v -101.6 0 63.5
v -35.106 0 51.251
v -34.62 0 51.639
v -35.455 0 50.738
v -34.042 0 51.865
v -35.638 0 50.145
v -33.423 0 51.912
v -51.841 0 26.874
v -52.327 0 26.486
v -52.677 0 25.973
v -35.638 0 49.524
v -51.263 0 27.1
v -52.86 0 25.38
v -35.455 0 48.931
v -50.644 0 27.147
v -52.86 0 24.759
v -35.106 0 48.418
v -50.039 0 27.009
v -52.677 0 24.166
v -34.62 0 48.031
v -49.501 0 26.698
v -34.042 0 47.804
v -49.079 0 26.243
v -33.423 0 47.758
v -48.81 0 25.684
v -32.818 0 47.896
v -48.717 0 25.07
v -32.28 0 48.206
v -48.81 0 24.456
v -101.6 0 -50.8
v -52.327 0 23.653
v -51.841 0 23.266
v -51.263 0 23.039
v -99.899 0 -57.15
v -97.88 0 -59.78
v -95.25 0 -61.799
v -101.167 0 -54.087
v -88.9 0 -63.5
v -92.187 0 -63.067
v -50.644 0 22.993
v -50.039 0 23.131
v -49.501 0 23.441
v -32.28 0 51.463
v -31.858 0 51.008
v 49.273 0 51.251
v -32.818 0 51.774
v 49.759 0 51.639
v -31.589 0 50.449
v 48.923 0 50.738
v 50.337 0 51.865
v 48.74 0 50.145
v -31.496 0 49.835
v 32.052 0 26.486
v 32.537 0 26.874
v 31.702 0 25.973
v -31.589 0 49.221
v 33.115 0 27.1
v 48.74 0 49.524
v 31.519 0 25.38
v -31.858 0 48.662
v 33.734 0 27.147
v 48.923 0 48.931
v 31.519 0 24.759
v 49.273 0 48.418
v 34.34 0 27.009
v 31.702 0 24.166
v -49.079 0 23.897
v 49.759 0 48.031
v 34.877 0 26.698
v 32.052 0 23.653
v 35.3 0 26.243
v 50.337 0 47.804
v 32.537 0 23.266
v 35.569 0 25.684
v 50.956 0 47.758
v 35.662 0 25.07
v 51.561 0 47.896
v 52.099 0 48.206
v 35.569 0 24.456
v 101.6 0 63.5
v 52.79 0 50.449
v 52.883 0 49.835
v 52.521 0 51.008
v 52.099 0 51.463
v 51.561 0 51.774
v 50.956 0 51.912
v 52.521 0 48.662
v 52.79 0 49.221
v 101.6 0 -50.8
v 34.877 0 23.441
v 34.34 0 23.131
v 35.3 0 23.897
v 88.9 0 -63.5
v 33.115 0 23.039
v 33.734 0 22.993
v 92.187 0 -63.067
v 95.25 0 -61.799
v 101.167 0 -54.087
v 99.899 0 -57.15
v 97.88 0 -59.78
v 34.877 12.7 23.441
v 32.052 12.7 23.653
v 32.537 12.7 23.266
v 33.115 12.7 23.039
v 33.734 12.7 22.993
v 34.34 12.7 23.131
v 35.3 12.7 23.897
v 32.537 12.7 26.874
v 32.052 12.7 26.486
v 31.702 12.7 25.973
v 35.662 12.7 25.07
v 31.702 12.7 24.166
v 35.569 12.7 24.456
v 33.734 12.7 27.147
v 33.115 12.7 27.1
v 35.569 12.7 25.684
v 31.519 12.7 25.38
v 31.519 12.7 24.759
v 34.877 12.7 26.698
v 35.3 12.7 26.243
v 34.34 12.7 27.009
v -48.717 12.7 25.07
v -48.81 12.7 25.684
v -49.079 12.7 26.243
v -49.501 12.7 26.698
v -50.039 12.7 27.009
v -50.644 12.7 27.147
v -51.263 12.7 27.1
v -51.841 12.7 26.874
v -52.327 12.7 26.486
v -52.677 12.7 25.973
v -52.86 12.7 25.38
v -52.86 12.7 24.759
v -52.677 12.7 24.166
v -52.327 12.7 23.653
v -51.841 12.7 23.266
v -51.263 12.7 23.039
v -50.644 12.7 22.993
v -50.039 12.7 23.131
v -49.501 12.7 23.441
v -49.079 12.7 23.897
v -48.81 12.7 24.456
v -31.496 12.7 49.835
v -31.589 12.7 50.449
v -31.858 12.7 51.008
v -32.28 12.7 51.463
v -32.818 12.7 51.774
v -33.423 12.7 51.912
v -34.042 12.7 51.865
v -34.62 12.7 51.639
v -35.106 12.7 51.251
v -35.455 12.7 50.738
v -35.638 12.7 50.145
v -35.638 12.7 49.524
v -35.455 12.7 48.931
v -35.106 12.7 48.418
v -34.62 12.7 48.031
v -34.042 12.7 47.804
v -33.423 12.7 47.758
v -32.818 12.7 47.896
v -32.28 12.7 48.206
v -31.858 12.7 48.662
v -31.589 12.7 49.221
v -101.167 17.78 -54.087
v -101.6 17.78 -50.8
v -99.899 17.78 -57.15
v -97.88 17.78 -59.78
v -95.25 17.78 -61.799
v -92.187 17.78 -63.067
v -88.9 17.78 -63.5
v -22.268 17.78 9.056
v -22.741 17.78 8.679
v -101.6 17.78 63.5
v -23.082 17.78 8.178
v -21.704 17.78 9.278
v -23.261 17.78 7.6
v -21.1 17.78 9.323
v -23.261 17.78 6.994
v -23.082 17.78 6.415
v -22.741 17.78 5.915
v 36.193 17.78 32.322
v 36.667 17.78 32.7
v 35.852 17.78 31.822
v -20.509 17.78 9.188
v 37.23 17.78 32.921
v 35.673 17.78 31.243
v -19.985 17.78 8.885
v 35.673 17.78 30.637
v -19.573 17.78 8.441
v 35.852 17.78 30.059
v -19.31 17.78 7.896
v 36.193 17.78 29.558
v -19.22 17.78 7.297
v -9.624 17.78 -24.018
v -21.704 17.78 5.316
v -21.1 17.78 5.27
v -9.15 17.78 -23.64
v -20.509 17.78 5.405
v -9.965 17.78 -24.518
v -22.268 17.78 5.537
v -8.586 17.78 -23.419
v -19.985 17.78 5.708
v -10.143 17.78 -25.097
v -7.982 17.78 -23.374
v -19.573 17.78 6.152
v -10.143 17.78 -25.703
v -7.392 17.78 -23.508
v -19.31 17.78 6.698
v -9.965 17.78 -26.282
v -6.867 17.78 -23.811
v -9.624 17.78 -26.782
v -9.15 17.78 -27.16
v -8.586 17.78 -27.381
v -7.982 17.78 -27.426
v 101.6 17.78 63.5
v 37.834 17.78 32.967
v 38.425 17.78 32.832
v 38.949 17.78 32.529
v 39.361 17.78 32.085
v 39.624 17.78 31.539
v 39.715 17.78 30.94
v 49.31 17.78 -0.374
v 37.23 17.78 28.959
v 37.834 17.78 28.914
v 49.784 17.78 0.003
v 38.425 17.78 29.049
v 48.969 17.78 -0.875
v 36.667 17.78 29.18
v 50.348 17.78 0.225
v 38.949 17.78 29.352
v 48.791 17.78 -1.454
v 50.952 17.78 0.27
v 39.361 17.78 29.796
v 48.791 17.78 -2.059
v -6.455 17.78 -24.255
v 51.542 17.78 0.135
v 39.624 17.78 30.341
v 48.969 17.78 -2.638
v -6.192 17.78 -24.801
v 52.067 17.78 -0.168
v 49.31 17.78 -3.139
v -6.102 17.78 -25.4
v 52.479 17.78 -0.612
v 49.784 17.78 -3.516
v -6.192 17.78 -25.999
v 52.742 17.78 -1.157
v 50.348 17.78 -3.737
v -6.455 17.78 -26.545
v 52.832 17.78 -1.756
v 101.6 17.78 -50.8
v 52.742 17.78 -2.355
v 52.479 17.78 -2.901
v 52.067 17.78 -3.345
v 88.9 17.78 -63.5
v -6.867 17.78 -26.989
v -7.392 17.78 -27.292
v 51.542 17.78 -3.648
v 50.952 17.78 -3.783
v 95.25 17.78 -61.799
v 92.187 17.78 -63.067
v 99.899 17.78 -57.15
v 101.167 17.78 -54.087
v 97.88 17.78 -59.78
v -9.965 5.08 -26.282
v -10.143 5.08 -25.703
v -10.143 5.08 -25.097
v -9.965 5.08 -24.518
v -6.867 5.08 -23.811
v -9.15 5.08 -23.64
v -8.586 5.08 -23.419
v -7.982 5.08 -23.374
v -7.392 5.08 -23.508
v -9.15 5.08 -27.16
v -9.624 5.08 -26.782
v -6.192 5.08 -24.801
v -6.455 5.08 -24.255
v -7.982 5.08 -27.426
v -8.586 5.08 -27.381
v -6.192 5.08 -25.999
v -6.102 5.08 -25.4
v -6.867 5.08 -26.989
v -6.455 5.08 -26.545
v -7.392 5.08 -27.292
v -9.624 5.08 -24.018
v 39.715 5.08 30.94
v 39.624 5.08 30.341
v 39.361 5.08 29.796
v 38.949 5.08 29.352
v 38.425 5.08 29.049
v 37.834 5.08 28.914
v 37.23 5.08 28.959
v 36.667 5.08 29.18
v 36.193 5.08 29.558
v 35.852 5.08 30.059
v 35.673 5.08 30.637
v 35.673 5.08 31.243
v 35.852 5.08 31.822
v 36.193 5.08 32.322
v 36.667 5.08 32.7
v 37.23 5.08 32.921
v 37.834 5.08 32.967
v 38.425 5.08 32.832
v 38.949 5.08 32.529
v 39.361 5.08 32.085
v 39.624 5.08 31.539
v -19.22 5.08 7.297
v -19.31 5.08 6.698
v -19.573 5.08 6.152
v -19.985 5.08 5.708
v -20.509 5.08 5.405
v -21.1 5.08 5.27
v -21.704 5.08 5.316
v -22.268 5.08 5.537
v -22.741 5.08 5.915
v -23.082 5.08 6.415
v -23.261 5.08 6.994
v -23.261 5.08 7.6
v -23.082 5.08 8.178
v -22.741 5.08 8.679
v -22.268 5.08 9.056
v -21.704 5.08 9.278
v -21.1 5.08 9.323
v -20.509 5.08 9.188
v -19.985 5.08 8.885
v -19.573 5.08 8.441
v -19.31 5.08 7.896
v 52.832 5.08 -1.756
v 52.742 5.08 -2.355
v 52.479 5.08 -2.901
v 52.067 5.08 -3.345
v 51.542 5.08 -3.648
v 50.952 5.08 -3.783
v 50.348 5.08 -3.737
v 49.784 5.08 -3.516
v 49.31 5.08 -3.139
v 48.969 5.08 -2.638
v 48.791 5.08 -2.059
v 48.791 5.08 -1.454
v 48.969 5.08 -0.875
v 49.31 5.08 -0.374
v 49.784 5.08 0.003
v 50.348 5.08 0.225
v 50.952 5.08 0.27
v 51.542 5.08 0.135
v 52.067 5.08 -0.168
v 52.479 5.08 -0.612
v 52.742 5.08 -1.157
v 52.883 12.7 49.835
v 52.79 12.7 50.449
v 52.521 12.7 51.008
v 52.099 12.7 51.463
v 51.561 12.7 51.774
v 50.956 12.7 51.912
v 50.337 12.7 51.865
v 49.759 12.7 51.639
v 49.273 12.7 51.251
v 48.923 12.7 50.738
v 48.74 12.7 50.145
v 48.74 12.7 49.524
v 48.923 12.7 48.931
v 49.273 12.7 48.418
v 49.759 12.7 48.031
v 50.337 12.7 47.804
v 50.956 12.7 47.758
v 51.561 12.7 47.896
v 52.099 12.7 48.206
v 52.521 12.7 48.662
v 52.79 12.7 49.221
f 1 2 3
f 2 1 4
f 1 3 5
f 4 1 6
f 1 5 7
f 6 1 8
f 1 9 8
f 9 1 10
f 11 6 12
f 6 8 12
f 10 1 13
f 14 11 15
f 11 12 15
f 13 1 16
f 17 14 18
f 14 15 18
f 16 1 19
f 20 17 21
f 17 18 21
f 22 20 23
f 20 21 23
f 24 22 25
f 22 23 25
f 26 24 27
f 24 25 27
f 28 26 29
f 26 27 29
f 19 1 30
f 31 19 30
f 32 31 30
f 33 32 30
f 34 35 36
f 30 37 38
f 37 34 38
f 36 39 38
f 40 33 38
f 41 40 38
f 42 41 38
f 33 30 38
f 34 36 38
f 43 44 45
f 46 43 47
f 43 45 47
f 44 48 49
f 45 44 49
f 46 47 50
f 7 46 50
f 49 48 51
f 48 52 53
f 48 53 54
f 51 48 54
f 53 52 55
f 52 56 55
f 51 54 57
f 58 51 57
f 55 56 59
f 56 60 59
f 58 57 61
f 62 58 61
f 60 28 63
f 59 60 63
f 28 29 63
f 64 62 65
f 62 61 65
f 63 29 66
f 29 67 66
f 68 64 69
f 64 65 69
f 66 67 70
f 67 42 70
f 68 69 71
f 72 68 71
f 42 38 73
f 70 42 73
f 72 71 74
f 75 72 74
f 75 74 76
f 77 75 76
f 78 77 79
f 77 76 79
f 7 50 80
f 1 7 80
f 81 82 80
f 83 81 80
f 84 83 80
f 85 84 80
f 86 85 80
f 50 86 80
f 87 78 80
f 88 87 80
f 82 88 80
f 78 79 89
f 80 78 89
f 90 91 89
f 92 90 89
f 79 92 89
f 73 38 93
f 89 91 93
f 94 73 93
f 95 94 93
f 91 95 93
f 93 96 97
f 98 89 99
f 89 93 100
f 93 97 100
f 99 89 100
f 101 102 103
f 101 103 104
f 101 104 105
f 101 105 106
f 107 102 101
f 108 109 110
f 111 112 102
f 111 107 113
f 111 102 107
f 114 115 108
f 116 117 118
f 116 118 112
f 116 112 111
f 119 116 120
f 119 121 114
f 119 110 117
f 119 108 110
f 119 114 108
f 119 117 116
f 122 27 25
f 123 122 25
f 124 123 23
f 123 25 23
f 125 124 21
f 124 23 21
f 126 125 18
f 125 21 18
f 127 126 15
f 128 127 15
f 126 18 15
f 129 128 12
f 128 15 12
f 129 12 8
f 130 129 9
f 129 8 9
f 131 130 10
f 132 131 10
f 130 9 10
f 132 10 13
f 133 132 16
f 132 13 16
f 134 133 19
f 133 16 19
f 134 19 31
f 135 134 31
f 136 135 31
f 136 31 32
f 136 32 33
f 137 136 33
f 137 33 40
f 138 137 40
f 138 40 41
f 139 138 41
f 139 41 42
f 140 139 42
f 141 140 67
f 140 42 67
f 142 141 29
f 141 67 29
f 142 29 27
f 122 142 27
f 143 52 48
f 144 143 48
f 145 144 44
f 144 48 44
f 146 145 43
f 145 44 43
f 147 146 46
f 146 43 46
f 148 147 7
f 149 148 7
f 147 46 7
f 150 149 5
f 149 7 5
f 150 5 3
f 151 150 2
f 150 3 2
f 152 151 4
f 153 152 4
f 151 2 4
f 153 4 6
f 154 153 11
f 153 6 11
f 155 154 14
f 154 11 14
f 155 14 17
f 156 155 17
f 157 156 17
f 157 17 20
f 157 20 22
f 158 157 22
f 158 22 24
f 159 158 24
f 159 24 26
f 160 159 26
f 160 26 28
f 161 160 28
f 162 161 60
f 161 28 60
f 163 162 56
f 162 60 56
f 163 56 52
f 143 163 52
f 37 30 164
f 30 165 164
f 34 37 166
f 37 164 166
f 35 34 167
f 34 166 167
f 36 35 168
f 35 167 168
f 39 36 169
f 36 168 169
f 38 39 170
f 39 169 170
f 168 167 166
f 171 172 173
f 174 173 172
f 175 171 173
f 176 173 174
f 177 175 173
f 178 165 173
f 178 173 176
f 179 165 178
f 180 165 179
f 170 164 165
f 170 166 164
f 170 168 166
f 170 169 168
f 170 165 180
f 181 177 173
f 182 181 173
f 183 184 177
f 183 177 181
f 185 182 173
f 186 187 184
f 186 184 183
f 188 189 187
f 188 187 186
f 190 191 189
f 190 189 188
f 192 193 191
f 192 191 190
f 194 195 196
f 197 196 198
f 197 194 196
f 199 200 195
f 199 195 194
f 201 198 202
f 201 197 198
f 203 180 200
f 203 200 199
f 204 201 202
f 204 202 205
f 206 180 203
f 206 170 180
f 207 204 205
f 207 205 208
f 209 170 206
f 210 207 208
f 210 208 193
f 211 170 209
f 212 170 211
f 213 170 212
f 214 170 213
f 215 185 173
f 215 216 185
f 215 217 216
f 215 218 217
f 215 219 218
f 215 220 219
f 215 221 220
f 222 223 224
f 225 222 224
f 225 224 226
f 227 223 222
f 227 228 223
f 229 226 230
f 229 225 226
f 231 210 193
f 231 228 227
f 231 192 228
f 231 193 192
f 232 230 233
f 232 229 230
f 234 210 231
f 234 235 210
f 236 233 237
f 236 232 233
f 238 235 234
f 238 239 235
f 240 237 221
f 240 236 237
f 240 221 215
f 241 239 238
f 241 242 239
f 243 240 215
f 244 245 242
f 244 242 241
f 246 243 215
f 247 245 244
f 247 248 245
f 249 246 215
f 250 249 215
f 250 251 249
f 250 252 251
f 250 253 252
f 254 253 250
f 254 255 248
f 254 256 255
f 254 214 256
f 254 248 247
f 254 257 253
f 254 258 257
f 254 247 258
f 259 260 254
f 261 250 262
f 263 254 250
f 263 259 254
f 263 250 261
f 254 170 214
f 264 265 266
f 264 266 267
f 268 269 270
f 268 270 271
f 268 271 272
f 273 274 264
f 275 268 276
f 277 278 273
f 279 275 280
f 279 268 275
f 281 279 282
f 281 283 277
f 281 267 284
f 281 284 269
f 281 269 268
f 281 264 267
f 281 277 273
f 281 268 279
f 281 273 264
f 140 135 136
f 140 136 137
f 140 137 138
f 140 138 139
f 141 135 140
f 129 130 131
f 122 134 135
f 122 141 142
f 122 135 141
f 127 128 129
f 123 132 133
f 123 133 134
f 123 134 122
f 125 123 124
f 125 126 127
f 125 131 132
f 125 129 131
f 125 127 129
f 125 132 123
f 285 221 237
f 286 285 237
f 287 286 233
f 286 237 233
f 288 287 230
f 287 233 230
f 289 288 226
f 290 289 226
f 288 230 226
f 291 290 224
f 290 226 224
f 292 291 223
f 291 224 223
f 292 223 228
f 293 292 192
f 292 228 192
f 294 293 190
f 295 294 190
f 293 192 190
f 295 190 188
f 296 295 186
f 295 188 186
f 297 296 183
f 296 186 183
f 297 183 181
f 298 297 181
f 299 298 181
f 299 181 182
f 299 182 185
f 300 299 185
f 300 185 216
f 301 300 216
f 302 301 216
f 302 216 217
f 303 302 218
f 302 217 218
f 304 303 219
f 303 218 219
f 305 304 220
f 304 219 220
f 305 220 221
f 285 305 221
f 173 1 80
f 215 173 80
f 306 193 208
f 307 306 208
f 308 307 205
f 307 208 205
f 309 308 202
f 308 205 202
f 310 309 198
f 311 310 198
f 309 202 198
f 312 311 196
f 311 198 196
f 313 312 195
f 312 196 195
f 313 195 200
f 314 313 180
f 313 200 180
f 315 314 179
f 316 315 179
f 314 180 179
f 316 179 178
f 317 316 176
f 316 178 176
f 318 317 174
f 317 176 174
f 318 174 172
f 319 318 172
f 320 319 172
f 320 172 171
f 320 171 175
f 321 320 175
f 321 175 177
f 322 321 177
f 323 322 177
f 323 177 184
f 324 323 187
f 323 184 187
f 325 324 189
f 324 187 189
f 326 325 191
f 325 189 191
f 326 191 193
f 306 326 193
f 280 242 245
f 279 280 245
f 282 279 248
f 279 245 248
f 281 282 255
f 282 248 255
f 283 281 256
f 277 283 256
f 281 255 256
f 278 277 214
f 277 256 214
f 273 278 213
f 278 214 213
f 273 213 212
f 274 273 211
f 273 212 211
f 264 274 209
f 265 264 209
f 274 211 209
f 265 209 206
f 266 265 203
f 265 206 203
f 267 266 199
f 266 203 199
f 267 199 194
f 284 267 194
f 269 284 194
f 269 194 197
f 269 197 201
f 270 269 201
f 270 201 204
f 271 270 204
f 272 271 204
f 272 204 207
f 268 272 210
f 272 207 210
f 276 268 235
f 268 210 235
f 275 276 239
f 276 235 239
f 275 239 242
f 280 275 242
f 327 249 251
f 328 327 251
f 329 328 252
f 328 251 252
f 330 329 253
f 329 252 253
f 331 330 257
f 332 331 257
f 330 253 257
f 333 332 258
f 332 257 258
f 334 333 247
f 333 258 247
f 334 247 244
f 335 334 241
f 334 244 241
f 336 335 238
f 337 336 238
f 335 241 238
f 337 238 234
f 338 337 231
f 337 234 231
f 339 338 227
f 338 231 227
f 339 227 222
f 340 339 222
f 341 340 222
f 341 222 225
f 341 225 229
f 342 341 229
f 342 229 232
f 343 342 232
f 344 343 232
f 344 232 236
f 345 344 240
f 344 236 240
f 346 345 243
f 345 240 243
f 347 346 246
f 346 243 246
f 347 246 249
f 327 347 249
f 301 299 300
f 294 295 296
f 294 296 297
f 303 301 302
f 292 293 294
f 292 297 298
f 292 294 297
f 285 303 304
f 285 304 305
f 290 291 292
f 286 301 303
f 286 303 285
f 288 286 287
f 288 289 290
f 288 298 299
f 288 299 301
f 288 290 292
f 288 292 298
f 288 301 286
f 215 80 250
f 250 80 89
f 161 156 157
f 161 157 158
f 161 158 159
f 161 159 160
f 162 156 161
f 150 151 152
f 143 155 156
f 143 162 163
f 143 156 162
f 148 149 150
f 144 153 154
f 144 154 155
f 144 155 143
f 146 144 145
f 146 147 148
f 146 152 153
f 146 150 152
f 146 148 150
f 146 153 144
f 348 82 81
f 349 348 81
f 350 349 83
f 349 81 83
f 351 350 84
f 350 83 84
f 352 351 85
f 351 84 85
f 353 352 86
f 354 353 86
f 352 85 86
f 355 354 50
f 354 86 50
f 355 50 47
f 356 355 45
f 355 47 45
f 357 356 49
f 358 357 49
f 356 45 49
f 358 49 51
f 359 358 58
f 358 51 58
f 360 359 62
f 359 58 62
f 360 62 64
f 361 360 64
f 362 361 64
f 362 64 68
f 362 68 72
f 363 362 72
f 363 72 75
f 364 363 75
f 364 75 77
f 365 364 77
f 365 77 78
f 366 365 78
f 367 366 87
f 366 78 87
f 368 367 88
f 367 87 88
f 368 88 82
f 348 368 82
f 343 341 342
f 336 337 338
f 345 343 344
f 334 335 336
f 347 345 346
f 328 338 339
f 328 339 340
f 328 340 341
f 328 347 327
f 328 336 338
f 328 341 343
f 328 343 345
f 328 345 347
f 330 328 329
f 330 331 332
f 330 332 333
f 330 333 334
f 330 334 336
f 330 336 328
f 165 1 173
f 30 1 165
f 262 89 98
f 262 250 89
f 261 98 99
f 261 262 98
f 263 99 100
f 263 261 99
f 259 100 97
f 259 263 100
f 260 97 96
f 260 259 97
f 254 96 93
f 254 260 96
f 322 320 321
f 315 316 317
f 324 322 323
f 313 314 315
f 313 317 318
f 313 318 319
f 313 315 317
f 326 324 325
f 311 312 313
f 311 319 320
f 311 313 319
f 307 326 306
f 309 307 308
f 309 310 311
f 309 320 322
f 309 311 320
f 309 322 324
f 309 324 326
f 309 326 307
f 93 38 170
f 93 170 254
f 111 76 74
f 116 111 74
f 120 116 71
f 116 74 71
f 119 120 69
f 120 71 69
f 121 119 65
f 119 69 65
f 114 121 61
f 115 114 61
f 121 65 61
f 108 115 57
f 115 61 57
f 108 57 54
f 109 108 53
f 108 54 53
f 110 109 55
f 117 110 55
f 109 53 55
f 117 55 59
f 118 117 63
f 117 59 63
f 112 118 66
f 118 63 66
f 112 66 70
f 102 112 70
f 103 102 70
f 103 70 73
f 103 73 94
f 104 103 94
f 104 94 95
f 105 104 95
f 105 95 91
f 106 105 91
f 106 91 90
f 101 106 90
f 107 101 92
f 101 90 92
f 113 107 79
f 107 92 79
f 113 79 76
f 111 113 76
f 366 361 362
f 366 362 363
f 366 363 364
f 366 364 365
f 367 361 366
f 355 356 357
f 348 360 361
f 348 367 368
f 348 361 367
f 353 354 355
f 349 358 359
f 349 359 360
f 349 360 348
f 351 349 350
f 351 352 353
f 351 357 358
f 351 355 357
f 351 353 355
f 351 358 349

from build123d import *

# Parameters (mm, degrees)
SKETCH2_W           = 203.2
SKETCH2_H           = 127
BOSS_EXTRUDE2_DEPTH = 17.78
FILLET1_R           = 12.7
SKETCH5_R           = 2.0828
CUT_EXTRUDE2_DEPTH  = 12.7
SKETCH6_R           = 2.032
CUT_EXTRUDE3_DEPTH  = 12.7


with BuildPart() as part:
    # Sketch2 → Boss-Extrude2 (new body)
    with BuildSketch(Plane(origin=(0, 0, 0), x_dir=(1, 0, 0), z_dir=(0, 1, 0))):
        Rectangle(SKETCH2_W, SKETCH2_H)
    extrude(amount=BOSS_EXTRUDE2_DEPTH)

    # Fillet1
    fillet1_edges = [part.edges().sort_by_distance(p)[0] for p in [
        (-101.6, 8.89, -63.5),
        (101.6, 8.89, -63.5),
    ]]
    fillet(fillet1_edges, radius=FILLET1_R)

    # Sketch5 → Cut-Extrude2 (cut)
    with BuildSketch(Plane.XZ):
        with Locations((50.8, 49.8348)):
            Circle(SKETCH5_R)
        with Locations((33.5788, 25.0698)):
            Circle(SKETCH5_R)
        with Locations((-50.8, 25.0698)):
            Circle(SKETCH5_R)
        with Locations((-33.5788, 49.8348)):
            Circle(SKETCH5_R)
    extrude(amount=-CUT_EXTRUDE2_DEPTH, mode=Mode.SUBTRACT)

    # Sketch6 → Cut-Extrude3 (cut)
    with BuildSketch(Plane(origin=(0, 17.78, 0), x_dir=(1, 0, 0), z_dir=(0, 1, 0))):
        with Locations((-8.13412282, 25.4)):
            Circle(SKETCH6_R)
        with Locations((50.8, 1.756413821)):
            Circle(SKETCH6_R)
        with Locations((-21.251584432, -7.296651341)):
            Circle(SKETCH6_R)
        with Locations((37.682538388, -30.94023752)):
            Circle(SKETCH6_R)
    extrude(amount=-CUT_EXTRUDE3_DEPTH, mode=Mode.SUBTRACT)


solid = part.part
